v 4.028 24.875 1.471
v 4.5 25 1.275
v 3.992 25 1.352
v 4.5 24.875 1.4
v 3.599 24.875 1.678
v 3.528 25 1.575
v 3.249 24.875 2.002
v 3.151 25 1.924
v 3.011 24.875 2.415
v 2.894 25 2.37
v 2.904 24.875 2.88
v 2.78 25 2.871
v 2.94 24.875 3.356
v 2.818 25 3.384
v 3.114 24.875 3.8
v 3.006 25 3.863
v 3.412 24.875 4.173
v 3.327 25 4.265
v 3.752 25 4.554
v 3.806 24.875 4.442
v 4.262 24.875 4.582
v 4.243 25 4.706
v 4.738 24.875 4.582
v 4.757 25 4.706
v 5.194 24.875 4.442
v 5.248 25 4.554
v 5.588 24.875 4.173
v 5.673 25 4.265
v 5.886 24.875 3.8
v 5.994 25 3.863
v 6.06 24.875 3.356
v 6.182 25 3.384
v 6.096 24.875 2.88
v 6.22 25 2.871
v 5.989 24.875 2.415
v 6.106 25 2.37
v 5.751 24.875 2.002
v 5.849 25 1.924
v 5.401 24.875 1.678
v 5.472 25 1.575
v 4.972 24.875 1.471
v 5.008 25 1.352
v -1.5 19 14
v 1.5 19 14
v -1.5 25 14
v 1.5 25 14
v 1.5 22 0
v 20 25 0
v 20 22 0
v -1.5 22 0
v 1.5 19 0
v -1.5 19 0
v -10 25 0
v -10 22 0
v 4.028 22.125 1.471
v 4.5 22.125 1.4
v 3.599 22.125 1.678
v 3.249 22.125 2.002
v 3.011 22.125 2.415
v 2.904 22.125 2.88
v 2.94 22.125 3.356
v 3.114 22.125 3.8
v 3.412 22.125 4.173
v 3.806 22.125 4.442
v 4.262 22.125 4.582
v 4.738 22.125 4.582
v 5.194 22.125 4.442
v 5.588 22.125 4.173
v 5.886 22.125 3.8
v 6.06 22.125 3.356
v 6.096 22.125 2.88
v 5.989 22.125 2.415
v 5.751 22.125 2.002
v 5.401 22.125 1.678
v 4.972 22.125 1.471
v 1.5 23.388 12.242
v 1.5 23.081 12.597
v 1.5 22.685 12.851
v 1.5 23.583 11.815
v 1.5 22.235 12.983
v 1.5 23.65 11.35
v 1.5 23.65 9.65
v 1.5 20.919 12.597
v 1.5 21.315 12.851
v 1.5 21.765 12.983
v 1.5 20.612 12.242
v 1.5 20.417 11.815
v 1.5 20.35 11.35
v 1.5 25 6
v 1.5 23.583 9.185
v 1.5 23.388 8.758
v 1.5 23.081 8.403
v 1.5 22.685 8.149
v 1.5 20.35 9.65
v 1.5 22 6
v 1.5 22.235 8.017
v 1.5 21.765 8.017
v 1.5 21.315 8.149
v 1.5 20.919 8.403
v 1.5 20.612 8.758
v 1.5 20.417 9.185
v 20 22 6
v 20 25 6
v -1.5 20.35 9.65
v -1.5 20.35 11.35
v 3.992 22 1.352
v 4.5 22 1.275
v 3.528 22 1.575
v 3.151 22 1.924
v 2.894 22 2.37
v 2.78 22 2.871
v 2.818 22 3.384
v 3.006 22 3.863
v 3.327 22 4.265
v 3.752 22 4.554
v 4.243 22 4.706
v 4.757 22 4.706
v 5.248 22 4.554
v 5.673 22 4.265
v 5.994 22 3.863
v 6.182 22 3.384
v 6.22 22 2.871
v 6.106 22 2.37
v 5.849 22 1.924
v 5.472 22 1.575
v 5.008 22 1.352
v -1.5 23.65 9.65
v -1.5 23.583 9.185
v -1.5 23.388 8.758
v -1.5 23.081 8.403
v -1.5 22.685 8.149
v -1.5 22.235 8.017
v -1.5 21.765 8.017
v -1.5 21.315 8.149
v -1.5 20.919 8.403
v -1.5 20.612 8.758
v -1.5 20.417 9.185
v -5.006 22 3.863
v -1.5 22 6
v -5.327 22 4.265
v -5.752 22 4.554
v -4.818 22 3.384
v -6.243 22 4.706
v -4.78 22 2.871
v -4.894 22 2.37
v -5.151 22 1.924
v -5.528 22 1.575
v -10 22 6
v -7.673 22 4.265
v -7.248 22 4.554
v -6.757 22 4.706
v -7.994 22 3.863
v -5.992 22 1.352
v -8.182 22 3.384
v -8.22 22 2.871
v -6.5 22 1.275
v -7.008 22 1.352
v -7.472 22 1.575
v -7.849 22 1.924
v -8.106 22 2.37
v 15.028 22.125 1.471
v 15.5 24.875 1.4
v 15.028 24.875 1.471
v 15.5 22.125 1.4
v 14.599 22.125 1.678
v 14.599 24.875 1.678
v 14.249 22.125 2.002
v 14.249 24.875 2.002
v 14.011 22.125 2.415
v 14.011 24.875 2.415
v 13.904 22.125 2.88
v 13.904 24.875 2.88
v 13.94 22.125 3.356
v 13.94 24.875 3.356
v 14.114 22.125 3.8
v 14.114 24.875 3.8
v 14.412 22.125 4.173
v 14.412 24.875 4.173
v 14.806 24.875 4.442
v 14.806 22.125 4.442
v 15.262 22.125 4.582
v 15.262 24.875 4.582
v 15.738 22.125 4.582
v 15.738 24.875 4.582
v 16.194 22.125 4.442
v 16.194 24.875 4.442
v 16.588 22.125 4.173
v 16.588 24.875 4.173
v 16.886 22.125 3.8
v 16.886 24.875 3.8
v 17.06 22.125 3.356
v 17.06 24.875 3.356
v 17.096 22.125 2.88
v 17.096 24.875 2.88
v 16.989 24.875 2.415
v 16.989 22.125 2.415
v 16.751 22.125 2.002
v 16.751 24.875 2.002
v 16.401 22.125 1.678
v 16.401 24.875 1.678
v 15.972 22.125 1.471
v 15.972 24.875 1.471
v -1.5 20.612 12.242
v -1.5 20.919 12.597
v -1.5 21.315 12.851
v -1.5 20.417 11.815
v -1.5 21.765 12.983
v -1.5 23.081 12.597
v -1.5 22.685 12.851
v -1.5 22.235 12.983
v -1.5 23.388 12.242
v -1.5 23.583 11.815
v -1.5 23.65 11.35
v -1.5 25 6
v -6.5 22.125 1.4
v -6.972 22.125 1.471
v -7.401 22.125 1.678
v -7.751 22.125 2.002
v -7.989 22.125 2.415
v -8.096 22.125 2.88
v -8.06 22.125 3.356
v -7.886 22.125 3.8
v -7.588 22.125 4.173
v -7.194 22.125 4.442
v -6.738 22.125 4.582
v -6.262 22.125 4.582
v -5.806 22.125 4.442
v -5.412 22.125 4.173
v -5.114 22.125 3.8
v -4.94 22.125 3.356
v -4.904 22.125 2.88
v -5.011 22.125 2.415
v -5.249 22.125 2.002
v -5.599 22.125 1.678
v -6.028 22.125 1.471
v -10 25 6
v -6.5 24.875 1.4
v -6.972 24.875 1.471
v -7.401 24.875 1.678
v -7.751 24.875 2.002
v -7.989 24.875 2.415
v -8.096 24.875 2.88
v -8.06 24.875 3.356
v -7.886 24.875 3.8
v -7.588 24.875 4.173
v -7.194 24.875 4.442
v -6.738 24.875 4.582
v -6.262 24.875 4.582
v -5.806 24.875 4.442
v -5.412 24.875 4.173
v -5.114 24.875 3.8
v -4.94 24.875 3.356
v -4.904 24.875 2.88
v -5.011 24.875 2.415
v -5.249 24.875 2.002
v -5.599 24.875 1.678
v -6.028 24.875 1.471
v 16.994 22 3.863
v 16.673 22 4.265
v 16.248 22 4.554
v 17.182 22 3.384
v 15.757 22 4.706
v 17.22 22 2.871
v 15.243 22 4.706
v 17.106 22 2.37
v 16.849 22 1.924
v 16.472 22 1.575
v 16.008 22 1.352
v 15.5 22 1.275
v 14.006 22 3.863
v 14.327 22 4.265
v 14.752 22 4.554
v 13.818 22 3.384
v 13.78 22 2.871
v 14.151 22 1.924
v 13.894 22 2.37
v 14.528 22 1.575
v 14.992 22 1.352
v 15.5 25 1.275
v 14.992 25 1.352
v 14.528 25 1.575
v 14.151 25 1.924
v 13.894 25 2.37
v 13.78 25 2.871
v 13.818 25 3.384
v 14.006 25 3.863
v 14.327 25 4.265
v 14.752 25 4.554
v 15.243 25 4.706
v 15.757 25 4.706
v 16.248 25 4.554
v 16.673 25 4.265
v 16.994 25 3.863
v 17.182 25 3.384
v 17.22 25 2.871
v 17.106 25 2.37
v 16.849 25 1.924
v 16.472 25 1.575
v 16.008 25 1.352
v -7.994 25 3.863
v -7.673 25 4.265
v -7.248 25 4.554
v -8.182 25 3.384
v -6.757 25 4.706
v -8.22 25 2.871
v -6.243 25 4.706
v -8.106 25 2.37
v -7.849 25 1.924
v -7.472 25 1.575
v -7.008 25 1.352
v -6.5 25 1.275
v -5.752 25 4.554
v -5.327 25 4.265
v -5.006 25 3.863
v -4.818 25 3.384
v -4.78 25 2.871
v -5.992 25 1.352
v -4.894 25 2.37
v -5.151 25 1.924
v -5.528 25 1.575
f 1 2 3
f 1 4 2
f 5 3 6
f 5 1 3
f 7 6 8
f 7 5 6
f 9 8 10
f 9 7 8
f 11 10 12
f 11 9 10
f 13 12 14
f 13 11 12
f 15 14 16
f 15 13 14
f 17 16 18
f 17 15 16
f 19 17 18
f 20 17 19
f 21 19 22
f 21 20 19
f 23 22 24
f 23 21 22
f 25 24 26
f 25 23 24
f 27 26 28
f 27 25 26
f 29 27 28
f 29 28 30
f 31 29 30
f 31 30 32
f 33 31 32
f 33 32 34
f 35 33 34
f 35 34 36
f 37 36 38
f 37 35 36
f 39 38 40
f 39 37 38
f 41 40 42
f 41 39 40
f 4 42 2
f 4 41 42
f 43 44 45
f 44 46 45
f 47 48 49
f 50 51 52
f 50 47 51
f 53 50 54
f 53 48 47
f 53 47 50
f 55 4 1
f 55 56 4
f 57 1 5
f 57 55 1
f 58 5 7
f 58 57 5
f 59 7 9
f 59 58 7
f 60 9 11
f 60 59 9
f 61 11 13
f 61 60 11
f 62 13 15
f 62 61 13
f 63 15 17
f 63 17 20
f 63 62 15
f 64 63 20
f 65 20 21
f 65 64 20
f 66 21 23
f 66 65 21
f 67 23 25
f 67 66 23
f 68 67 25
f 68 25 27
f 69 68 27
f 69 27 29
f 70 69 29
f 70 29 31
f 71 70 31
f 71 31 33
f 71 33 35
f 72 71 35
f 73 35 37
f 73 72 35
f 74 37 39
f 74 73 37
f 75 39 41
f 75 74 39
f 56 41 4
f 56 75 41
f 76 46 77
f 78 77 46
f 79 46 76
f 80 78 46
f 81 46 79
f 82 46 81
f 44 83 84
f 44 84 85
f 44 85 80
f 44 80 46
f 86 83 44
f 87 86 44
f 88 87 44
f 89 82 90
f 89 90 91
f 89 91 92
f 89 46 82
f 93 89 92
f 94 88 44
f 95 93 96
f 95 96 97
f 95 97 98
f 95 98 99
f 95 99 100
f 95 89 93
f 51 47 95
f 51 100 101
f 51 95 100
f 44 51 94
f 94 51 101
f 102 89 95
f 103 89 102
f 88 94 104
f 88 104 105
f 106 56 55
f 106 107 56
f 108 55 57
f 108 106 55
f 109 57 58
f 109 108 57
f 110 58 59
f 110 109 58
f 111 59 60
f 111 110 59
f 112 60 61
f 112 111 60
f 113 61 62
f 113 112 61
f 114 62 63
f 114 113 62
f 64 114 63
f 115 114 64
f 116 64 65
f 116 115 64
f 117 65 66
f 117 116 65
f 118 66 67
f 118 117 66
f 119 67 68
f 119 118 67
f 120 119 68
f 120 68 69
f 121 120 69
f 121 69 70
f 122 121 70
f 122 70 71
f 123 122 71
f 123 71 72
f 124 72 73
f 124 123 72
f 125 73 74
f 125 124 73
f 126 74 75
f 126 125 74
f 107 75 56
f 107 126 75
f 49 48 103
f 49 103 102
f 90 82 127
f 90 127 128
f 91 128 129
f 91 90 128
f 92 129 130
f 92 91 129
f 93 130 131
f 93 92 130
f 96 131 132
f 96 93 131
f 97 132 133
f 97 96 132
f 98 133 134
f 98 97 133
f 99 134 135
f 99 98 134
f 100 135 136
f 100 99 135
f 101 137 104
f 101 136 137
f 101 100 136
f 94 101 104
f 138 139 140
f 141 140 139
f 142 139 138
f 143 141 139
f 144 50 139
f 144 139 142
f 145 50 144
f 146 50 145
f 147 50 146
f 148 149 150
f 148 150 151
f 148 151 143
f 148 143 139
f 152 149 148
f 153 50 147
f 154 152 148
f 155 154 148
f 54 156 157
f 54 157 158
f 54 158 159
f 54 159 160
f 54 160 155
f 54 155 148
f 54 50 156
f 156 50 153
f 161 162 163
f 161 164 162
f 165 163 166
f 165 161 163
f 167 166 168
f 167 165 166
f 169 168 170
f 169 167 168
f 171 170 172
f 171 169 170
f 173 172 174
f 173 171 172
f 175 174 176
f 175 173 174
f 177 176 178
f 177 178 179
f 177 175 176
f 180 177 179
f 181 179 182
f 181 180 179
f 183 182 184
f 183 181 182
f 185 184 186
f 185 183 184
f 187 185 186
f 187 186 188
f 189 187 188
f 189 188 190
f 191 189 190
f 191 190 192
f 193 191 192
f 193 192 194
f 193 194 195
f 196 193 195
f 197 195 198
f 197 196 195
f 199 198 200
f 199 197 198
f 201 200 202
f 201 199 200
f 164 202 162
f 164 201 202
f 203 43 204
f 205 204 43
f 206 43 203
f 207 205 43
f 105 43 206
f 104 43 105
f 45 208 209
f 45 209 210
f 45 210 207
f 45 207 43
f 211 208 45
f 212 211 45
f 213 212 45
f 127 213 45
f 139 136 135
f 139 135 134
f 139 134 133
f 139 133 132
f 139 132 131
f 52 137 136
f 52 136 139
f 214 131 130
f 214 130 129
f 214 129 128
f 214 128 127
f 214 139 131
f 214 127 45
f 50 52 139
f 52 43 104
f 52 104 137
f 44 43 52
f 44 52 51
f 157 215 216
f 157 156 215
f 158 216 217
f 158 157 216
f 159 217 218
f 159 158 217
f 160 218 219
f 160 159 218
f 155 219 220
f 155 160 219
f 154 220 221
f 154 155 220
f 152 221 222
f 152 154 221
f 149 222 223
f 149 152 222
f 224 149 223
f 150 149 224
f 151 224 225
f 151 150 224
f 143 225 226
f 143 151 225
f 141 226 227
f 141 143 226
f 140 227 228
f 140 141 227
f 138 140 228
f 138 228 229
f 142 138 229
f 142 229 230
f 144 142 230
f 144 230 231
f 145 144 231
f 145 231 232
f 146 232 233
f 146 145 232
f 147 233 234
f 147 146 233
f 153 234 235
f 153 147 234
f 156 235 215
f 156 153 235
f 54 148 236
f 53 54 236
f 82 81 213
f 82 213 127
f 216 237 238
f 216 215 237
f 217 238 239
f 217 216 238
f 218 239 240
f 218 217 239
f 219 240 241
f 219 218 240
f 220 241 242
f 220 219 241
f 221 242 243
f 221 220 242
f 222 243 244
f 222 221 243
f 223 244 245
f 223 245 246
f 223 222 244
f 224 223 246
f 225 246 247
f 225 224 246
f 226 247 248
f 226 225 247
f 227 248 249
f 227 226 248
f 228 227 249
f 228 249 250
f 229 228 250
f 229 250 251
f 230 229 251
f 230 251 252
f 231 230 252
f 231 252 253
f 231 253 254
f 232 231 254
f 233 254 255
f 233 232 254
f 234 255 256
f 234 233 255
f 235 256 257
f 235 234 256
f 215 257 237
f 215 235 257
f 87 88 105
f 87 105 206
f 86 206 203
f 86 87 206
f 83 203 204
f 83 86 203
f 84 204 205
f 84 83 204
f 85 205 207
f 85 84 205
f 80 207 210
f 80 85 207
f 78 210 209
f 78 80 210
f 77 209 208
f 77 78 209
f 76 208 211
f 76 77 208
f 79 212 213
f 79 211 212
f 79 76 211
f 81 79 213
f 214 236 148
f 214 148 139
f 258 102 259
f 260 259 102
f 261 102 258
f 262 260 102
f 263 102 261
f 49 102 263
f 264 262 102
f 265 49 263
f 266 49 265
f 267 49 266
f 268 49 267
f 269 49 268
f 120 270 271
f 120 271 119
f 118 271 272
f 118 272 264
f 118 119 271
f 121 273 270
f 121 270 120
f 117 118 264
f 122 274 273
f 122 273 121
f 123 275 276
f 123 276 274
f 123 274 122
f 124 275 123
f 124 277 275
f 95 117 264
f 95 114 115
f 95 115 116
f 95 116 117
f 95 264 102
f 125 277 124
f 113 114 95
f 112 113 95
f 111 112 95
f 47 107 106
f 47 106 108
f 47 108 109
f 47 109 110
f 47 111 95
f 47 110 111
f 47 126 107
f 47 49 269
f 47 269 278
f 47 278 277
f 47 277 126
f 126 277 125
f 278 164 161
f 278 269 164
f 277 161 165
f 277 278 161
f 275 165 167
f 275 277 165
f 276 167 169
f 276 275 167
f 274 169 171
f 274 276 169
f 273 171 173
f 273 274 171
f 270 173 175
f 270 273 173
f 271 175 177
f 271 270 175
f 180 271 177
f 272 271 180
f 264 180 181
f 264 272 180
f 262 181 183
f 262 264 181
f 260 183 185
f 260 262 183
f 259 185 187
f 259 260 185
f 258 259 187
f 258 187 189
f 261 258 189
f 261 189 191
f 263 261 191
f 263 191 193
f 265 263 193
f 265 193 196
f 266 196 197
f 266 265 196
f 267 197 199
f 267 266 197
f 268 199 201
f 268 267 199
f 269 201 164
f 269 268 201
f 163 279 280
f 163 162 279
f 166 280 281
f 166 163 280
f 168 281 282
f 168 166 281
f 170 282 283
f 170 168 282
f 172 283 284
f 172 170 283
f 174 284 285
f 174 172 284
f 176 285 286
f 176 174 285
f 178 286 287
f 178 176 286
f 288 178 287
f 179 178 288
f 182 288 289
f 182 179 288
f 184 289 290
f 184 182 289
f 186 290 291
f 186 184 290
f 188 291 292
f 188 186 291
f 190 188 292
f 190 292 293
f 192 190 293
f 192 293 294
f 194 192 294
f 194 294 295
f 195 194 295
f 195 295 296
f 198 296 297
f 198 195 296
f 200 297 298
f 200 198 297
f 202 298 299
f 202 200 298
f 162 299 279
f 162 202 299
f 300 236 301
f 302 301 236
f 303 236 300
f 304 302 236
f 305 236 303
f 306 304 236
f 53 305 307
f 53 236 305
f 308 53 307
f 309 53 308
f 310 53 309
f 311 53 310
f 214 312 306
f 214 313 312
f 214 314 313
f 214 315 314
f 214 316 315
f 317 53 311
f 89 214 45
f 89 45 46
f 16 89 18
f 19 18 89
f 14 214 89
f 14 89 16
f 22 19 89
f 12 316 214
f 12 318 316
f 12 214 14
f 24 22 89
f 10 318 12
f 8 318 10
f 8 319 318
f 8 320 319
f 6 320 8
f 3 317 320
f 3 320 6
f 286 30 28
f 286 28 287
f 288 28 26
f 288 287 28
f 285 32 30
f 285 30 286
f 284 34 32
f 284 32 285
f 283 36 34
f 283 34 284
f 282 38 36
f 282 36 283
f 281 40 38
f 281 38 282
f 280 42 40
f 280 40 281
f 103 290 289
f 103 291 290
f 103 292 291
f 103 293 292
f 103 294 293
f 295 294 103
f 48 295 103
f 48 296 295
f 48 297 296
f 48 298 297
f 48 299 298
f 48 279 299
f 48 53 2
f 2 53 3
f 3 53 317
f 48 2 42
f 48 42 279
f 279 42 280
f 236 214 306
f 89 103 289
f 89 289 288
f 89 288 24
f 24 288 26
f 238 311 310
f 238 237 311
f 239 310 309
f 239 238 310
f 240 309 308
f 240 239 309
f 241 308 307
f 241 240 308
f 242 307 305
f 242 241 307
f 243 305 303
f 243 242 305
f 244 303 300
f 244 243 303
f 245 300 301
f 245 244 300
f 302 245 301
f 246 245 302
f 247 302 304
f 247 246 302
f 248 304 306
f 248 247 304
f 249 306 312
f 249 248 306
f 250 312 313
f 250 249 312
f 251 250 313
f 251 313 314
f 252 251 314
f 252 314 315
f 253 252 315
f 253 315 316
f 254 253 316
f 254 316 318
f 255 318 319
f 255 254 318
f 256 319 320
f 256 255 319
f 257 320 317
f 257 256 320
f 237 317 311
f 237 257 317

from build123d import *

# Parameters (mm, degrees)
EXTRUDE_1_DEPTH            = 14
SKETCH_2_W                 = 10
SKETCH_2_H                 = 3
SKETCH_2_W_2               = 3
SKETCH_2_H_2               = 19
CUT_EXTRUDE_1_DEPTH        = 15
SKETCH_3_W                 = 8.5
SKETCH_3_H                 = 3
SKETCH_3_W_2               = 18.5
CUT_EXTRUDE_3_DEPTH        = 8
HOLE_WIZARD_M31_AT_2_COUNT = 2
HOLE_WIZARD_M31_AT_2_PITCH = 22
HOLE_WIZARD_M31_AT_3_COUNT = 2
HOLE_WIZARD_M31_AT_3_PITCH = 11
CUT_EXTRUDE_4_REACH        = 13.5


with BuildPart() as part:
    # Эскиз1 → Бобышка-Вытянуть1 (new body)
    with BuildSketch(Plane.XY):
        Polygon((-1.5, 0), (-1.5, 22), (-20, 22), (-20, 25), (20, 25), (20, 22), (1.5, 22), (1.5, 0), align=None)
    extrude(amount=EXTRUDE_1_DEPTH)

    # Эскиз2 → Вырез-Вытянуть1 (cut, through all)
    with BuildSketch(Plane.XY.offset(14)):
        with Locations((-15, 23.5)):
            Rectangle(SKETCH_2_W, SKETCH_2_H)
        with Locations((0, 9.5)):
            Rectangle(SKETCH_2_W_2, SKETCH_2_H_2)
    extrude(amount=-CUT_EXTRUDE_1_DEPTH, mode=Mode.SUBTRACT)

    # Эскиз3 → Вырез-Вытянуть3 (cut)
    with BuildSketch(Plane.XY.offset(14)):
        with Locations((-5.75, 23.5)):
            Rectangle(SKETCH_3_W, SKETCH_3_H)
        with Locations((10.75, 23.5)):
            Rectangle(SKETCH_3_W_2, SKETCH_3_H)
    extrude(amount=-CUT_EXTRUDE_3_DEPTH, mode=Mode.SUBTRACT)

    # Эскиз4 → Отверстие с зазором M31 (revolve, cut)
    with BuildSketch(Plane(origin=(-6.5, 22, 3), x_dir=(0, 0, -1), z_dir=(1, 0, 0))):
        Polygon((0, 0), (0, 3), (1.725, 3), (1.6, 2.875), (1.6, 0.125), (1.725, 0), align=None)
    hole_wizard_m31 = revolve(axis=Axis((-6.5, 15.65, 3), (0, 1, 0)), mode=Mode.SUBTRACT)

    # Отверстие с зазором M31 at 2: Отверстие с зазором M31 ×2
    with Locations(*[(i * HOLE_WIZARD_M31_AT_2_PITCH, 0, 0) for i in range(1, HOLE_WIZARD_M31_AT_2_COUNT)]):
        add(hole_wizard_m31, mode=Mode.SUBTRACT)

    # Отверстие с зазором M31 at 3: Отверстие с зазором M31 ×2
    with Locations(*[(i * HOLE_WIZARD_M31_AT_3_PITCH, 0, 0) for i in range(1, HOLE_WIZARD_M31_AT_3_COUNT)]):
        add(hole_wizard_m31, mode=Mode.SUBTRACT)

    # Эскиз6 → Вырез-Вытянуть4 (cut, up to next)
    with BuildSketch(Plane(origin=(1.5, 0, 0), x_dir=(0, 0, -1), z_dir=(1, 0, 0)), mode=Mode.PRIVATE) as cut_extrude_4_sk1:
        with BuildLine():
            Line((-11.35, 23.65), (-9.65, 23.65))
            ThreePointArc((-9.65, 23.65), (-8, 22), (-9.65, 20.35))
            Line((-9.65, 20.35), (-11.35, 20.35))
            ThreePointArc((-11.35, 20.35), (-13, 22), (-11.35, 23.65))
        make_face()
    cut_extrude_4_tool1 = extrude(cut_extrude_4_sk1.sketch, amount=-CUT_EXTRUDE_4_REACH, mode=Mode.PRIVATE) & part.part
    add(cut_extrude_4_tool1.solids().sort_by_distance((1.5, 22, 10.5))[0], mode=Mode.SUBTRACT)


solid = part.part
